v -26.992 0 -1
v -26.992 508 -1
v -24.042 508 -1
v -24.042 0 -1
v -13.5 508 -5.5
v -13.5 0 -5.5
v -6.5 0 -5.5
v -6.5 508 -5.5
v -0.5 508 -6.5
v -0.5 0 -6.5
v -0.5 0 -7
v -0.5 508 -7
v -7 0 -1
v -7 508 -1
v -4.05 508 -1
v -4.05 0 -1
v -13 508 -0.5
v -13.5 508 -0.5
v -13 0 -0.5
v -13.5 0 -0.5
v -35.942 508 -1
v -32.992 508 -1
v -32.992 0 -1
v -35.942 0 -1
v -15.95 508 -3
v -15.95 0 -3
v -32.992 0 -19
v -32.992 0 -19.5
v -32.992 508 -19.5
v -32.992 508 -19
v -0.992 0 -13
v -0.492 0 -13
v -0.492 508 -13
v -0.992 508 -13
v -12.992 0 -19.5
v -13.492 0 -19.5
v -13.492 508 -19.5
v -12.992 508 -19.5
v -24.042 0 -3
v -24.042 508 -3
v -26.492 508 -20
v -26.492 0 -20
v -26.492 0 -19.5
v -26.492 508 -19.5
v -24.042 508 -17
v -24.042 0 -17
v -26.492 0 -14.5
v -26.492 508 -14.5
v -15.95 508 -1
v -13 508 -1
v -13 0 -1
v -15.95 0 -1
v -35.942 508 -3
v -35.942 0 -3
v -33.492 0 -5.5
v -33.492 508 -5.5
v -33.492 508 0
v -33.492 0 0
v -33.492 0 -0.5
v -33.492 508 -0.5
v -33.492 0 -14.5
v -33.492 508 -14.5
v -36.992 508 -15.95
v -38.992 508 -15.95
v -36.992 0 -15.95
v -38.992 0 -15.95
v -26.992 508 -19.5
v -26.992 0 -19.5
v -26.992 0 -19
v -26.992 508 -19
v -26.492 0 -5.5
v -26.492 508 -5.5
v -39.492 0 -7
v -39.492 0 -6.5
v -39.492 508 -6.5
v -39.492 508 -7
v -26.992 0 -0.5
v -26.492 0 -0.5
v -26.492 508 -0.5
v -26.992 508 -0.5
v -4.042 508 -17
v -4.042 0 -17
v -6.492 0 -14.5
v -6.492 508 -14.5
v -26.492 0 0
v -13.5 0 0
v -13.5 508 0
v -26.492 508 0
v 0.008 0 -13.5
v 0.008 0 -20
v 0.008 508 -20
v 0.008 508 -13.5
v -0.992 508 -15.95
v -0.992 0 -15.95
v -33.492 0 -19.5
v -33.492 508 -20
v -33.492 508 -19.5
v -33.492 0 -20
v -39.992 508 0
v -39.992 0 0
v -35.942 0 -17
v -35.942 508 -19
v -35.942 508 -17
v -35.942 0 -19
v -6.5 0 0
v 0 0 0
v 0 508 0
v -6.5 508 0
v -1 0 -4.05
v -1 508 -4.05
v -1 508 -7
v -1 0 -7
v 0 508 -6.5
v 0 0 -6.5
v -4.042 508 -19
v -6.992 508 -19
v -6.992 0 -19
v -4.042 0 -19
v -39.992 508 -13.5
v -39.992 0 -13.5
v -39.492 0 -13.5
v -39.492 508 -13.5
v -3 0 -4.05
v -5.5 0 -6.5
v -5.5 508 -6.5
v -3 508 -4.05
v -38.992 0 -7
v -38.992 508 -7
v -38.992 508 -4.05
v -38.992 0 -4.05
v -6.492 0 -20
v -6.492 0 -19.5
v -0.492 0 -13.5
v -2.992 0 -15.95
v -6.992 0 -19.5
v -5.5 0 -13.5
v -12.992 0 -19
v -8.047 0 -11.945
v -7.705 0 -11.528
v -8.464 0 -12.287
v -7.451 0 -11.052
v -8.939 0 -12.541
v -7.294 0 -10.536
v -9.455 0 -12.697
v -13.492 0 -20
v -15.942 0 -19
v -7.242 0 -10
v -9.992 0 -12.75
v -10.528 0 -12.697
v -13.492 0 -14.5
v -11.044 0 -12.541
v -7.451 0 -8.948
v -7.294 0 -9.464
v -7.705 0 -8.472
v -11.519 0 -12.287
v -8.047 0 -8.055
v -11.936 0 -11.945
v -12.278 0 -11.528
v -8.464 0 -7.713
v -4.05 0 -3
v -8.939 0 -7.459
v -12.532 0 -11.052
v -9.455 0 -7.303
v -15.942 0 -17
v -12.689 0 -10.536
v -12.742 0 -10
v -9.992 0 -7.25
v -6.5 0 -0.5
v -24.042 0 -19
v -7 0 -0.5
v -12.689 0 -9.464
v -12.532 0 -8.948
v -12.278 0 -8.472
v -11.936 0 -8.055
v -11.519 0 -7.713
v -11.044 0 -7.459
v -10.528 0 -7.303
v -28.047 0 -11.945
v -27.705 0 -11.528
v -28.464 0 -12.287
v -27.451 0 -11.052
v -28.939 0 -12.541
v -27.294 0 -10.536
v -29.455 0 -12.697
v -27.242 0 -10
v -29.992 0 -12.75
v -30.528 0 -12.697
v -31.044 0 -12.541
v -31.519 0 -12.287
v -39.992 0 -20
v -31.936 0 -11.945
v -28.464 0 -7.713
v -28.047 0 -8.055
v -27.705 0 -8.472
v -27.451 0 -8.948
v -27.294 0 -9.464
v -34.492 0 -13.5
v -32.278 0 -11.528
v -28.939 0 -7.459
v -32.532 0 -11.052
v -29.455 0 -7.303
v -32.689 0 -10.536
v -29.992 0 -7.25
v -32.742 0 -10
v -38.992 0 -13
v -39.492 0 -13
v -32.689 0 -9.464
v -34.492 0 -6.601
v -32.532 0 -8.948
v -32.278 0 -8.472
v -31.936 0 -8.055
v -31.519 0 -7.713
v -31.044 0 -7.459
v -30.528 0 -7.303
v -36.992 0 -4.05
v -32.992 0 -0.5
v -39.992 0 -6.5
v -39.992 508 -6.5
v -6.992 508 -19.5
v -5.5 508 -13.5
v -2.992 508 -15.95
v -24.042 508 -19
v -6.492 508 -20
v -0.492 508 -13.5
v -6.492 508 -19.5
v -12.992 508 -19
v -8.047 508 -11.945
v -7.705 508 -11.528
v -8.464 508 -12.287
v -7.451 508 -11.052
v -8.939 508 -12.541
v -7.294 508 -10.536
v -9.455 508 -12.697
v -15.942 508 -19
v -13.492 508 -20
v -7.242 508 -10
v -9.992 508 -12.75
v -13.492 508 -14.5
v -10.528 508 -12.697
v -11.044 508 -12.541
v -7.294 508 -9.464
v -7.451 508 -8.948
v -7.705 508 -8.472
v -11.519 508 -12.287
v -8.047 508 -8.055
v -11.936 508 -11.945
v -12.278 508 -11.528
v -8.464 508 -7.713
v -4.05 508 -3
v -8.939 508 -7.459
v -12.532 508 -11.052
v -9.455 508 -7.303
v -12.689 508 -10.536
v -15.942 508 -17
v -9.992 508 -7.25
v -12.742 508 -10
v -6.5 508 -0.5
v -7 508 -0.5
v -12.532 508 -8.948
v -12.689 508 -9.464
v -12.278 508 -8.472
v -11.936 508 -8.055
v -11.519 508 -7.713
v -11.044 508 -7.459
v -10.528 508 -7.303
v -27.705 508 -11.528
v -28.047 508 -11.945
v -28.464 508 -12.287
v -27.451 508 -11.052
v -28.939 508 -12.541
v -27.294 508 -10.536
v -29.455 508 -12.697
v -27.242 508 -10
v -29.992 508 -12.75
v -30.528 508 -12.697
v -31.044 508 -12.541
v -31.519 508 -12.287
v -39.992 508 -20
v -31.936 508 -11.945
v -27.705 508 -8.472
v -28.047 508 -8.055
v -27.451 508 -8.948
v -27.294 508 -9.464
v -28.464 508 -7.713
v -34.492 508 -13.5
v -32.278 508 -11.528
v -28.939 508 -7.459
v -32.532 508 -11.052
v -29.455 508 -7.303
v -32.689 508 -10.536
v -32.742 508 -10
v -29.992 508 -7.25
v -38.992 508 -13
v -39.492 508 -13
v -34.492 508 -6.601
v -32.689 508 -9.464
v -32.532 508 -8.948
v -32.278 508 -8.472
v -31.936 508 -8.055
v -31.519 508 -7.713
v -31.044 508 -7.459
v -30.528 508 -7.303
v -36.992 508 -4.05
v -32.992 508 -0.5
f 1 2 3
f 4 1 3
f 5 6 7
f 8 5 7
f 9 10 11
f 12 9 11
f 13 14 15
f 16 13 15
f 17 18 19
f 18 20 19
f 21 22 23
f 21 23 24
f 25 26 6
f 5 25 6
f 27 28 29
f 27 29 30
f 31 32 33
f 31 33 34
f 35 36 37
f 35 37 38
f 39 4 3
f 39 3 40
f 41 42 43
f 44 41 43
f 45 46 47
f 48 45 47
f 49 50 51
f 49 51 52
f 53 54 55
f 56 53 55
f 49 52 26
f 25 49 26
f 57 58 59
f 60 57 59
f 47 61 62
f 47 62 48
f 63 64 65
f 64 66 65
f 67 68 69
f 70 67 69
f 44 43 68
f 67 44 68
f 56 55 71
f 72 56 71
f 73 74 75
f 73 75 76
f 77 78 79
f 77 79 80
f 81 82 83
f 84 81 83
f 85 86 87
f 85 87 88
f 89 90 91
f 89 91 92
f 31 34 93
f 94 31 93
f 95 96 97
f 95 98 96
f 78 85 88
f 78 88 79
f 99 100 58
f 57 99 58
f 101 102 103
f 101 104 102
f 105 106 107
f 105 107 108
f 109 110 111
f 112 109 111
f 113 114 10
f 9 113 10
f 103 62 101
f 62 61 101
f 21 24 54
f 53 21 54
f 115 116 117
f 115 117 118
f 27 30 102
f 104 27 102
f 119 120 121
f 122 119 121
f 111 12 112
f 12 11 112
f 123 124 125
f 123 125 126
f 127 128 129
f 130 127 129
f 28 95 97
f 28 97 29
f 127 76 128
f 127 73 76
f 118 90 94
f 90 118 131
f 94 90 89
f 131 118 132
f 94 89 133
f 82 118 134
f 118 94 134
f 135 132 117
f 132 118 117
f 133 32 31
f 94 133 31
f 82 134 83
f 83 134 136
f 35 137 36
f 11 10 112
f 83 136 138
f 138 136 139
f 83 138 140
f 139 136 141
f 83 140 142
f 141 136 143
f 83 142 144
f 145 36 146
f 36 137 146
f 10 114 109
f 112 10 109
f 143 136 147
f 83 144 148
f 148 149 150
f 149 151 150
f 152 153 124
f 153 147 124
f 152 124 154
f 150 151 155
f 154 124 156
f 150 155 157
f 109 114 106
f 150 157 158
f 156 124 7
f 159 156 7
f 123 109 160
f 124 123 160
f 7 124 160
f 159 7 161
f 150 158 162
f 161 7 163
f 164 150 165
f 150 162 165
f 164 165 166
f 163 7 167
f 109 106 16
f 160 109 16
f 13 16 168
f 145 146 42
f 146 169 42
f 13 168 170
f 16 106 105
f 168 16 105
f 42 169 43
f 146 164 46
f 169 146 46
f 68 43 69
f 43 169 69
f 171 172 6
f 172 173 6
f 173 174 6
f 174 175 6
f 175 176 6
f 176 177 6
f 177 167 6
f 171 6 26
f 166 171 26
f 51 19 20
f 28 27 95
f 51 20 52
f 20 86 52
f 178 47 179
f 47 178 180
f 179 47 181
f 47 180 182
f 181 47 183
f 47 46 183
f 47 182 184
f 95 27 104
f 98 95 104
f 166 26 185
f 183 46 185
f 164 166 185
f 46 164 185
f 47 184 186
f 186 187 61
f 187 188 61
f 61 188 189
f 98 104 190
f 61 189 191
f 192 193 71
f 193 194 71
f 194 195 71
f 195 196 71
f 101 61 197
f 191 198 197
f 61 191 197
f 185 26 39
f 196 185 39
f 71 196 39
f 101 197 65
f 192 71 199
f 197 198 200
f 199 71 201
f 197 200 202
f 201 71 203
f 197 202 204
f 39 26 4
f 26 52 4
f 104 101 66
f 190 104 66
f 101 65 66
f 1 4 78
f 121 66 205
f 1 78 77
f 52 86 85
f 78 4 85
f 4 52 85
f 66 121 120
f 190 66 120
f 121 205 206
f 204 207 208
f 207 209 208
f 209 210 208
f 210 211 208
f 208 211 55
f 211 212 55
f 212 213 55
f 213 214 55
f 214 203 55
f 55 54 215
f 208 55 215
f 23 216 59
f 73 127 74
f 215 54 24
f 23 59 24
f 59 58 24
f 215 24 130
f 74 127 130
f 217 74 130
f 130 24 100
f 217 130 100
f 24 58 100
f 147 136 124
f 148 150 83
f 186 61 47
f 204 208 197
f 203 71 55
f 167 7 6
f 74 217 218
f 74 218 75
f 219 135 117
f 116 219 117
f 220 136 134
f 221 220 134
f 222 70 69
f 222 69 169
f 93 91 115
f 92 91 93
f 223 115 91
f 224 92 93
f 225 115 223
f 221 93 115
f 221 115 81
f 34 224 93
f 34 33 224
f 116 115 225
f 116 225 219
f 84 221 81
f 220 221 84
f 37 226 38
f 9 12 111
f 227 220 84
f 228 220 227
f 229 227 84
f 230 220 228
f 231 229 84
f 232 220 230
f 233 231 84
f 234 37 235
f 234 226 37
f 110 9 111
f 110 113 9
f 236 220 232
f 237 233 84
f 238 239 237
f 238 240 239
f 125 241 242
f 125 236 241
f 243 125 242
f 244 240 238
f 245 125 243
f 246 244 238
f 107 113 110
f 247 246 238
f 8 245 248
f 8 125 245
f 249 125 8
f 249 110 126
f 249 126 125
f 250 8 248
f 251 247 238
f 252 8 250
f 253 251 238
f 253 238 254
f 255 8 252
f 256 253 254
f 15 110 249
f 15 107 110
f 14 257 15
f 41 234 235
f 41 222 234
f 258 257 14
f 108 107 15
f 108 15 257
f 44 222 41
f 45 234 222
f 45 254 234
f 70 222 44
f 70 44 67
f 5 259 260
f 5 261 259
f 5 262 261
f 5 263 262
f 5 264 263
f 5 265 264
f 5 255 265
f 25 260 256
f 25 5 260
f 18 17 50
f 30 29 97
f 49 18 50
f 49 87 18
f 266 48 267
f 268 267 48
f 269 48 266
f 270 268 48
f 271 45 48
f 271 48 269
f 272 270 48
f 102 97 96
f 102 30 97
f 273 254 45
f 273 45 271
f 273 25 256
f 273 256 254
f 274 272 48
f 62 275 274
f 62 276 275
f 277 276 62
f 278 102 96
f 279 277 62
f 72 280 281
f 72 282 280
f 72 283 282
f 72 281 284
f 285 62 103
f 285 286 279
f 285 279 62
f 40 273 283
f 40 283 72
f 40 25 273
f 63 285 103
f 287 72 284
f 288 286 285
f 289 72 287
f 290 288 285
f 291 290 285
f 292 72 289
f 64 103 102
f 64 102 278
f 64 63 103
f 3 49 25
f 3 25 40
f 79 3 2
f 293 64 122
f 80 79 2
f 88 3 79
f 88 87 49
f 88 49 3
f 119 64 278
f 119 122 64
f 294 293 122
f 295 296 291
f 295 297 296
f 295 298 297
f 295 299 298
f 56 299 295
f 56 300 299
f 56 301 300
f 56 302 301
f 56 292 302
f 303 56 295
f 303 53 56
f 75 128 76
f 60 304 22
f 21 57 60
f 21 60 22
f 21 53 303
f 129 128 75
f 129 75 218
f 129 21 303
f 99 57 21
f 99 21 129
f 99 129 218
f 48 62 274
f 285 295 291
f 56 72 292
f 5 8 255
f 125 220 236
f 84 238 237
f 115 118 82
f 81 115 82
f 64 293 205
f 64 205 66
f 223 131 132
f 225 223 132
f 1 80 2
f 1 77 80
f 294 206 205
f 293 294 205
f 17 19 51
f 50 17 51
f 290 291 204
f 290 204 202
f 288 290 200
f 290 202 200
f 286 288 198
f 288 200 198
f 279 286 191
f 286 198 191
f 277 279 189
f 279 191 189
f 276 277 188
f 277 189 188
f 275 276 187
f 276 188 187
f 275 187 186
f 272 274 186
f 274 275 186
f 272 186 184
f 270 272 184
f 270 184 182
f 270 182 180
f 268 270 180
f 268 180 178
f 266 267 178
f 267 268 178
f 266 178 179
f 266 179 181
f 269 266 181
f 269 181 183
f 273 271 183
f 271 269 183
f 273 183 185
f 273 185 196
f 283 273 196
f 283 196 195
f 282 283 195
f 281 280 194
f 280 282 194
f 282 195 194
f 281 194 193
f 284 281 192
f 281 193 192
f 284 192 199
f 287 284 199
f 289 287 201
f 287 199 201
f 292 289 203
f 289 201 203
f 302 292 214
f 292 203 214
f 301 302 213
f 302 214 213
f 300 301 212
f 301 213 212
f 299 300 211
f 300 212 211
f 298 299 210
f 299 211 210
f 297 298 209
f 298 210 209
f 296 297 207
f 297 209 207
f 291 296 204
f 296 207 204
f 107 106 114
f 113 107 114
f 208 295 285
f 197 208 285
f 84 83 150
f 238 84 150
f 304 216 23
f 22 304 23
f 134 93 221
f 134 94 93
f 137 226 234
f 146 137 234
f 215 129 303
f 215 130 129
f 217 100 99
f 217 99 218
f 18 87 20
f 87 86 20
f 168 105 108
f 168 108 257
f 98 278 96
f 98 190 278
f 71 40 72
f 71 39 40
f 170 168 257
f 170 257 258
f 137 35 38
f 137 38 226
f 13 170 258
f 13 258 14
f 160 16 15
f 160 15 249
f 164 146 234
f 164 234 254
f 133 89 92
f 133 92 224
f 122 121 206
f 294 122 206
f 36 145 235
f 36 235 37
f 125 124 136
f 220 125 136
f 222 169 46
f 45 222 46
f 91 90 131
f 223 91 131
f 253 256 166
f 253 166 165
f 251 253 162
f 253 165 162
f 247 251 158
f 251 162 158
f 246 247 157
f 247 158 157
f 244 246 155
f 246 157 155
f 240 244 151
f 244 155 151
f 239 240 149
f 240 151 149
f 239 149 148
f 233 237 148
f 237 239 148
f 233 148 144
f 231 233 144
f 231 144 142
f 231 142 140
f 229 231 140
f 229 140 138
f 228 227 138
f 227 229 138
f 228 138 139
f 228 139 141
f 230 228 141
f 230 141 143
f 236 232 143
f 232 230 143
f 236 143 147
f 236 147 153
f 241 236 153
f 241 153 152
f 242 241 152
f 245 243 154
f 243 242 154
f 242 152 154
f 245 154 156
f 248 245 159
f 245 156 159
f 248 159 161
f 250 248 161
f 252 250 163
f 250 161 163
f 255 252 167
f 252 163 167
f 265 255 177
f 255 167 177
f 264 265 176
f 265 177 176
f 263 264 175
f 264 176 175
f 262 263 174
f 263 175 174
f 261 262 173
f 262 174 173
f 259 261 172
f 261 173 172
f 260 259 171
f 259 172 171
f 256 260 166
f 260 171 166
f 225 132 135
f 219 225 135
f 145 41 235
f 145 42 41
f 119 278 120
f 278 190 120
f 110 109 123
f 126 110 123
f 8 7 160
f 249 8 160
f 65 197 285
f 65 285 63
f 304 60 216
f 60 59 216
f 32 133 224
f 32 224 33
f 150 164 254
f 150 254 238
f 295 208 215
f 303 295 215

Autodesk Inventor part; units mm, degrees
ref_plane "YZ Plane" through (0, 0, 0) normal (1, 0, 0) x (0, 1, 0)
ref_plane "XZ Plane" through (0, 0, 0) normal (0, 1, 0) x (-1, 0, 0)
ref_plane "XY Plane" through (0, 0, 0) normal (0, 0, 1) x (1, 0, 0)
sketch "Sketch1" plane through (0, 0, 0) normal (0, 1, 0) x (-1, 0, 0)
  circle A0 centre (29.9915, -10) radius 2.75
  circle A1 centre (9.9915, -10) radius 2.75
  line L0 (0, 0) -> (0, -6.5)
  line L1 (-0.0085, -20) -> (-0.0085, -13.5)
  line L2 (0, -6.5) -> (0.5, -6.5)
  line L3 (0.5, -6.5) -> (0.5, -7)
  line L4 (0.5, -7) -> (1, -7)
  line L5 (-0.0085, -13.5) -> (0.4915, -13.5)
  line L6 (0.4915, -13.5) -> (0.4915, -13)
  line L7 (0.4915, -13) -> (0.9915, -13)
  line L8 (1, -4.05) -> (3, -4.05)
  line L9 (0.9915, -15.95) -> (2.9915, -15.95)
  line L10 (5.5, -6.5) -> (5.5, -13.5)
  line L11 (5.5, -13.5) -> (2.9915, -15.95)
  line L12 (5.5, -6.5) -> (3, -4.05)
  line L13 (1, -4.05) -> (1, -7)
  line L14 (0.9915, -13) -> (0.9915, -15.95)
  line L15 (-0.0085, -20) -> (6.4915, -20)
  line L16 (6.4915, -20) -> (6.4915, -19.5)
  line L17 (6.4915, -19.5) -> (6.9915, -19.5)
  line L18 (6.9915, -19.5) -> (6.9915, -19)
  line L19 (6.9915, -19) -> (4.0415, -19)
  line L20 (4.0415, -19) -> (4.0415, -17)
  line L21 (13.4915, -20) -> (13.4915, -19.5)
  line L22 (13.4915, -19.5) -> (12.9915, -19.5)
  line L23 (12.9915, -19.5) -> (12.9915, -19)
  line L24 (12.9915, -19) -> (15.9415, -19)
  line L25 (15.9415, -19) -> (15.9415, -17)
  line L26 (15.9415, -17) -> (13.4915, -14.5)
  line L27 (6.4915, -14.5) -> (13.4915, -14.5)
  line L28 (4.0415, -17) -> (6.4915, -14.5)
  line L29 (39.9915, 0) -> (39.9915, -6.5)
  line L30 (39.9915, -6.5) -> (39.4915, -6.5)
  line L31 (39.4915, -6.5) -> (39.4915, -7)
  line L32 (39.4915, -7) -> (38.9915, -7)
  line L33 (38.9915, -7) -> (38.9915, -4.05)
  line L34 (38.9915, -4.05) -> (36.9915, -4.05)
  line L35 (39.9915, -20) -> (39.9915, -13.5)
  line L36 (39.9915, -13.5) -> (39.4915, -13.5)
  line L37 (39.4915, -13.5) -> (39.4915, -13)
  line L38 (39.4915, -13) -> (38.9915, -13)
  line L39 (38.9915, -13) -> (38.9915, -15.95)
  line L40 (38.9915, -15.95) -> (36.9915, -15.95)
  line L41 (34.4915, -6.601) -> (34.4915, -13.5)
  line L42 (34.4915, -13.5) -> (36.9915, -15.95)
  line L43 (34.4915, -6.601) -> (36.9915, -4.05)
  line L44 (39.9915, -20) -> (33.4915, -20)
  line L45 (33.4915, -20) -> (33.4915, -19.5)
  line L46 (33.4915, -19.5) -> (32.9915, -19.5)
  line L47 (32.9915, -19.5) -> (32.9915, -19)
  line L48 (32.9915, -19) -> (35.9415, -19)
  line L49 (35.9415, -19) -> (35.9415, -17)
  line L50 (26.4915, -20) -> (26.4915, -19.5)
  line L51 (26.4915, -19.5) -> (26.9915, -19.5)
  line L52 (26.9915, -19.5) -> (26.9915, -19)
  line L53 (26.9915, -19) -> (24.0415, -19)
  line L54 (24.0415, -19) -> (24.0415, -17)
  line L55 (33.4915, -14.5) -> (26.4915, -14.5)
  line L56 (24.0415, -17) -> (26.4915, -14.5)
  line L57 (33.4915, -14.5) -> (35.9415, -17)
  line L58 (26.4915, -20) -> (13.4915, -20)
  line L59 (39.9915, 0) -> (33.4915, 0)
  line L60 (33.4915, 0) -> (33.4915, -0.5)
  line L61 (33.4915, -0.5) -> (32.9915, -0.5)
  line L62 (32.9915, -0.5) -> (32.9915, -1)
  line L63 (32.9915, -1) -> (35.9415, -1)
  line L64 (35.9415, -1) -> (35.9415, -3)
  line L65 (26.4915, 0) -> (26.4915, -0.5)
  line L66 (26.4915, -0.5) -> (26.9915, -0.5)
  line L67 (26.9915, -0.5) -> (26.9915, -1)
  line L68 (26.9915, -1) -> (24.0415, -1)
  line L69 (24.0415, -1) -> (24.0415, -3)
  line L70 (33.4915, -5.5) -> (26.4915, -5.5)
  line L71 (24.0415, -3) -> (26.4915, -5.5)
  line L72 (35.9415, -3) -> (33.4915, -5.5)
  line L73 (0, 0) -> (6.5, 0)
  line L74 (6.5, 0) -> (6.5, -0.5)
  line L75 (6.5, -0.5) -> (7, -0.5)
  line L76 (7, -0.5) -> (7, -1)
  line L77 (7, -1) -> (4.05, -1)
  line L78 (4.05, -1) -> (4.05, -3)
  line L79 (13.5, 0) -> (13.5, -0.5)
  line L80 (13.5, -0.5) -> (13, -0.5)
  line L81 (13, -0.5) -> (13, -1)
  line L82 (13, -1) -> (15.95, -1)
  line L83 (15.95, -1) -> (15.95, -3)
  line L84 (13.5, -5.5) -> (6.5, -5.5)
  line L85 (6.5, -5.5) -> (4.05, -3)
  line L86 (15.95, -3) -> (13.5, -5.5)
  line L87 (13.5, 0) -> (26.4915, 0)
  dimension "d0" = 40
  dimension "d1" = 20
  dimension "d2" = 5.5
  dimension "d3" = 5.5
  dimension "d4" = 20
  dimension "d11" = 6.5
  dimension "d12" = 6.5
  dimension "d13" = 0.5
  dimension "d14" = 0.5
  dimension "d15" = 0.5
  dimension "d16" = 0.5
  dimension "d17" = 0.5
  dimension "d18" = 0.5
  dimension "d19" = 5.5
  dimension "d20" = 11.9
  dimension "d21" = 6.5
  dimension "d22" = 0.5
  dimension "d23" = 0.5
  dimension "d24" = 0.5
  dimension "d25" = 0.5
  dimension "d26" = 0.5
  dimension "d27" = 0.5
  dimension "d28" = 7
  dimension "d29" = 11.9
  dimension "d31" = 4.05
  dimension "d32" = 2.95
  dimension "d34" = 2
  dimension "d35" = 2
  dimension "d36" = 2
  dimension "d37" = 2
  dimension "d39" = 7
  dimension "d40" = 6.5
  dimension "d41" = 0.5
  dimension "d42" = 0.5
  dimension "d43" = 0.5
  dimension "d44" = 2.95
  dimension "d45" = 2
  dimension "d46" = 6.5
  dimension "d47" = 0.5
  dimension "d48" = 0.5
  dimension "d49" = 0.5
  dimension "d50" = 2.95
  dimension "d51" = 2
  dimension "d52" = 5.5
  dimension "d53" = 6.5
  dimension "d54" = 0.5
  dimension "d55" = 0.5
  dimension "d56" = 0.5
  dimension "d57" = 2.95
  dimension "d58" = 2
  dimension "d59" = 0.5
  dimension "d60" = 0.5
  dimension "d61" = 0.5
  dimension "d62" = 2.95
  dimension "d63" = 2
  dimension "d64" = 7
  dimension "d66" = 6.5
  dimension "d67" = 0.5
  dimension "d68" = 0.5
  dimension "d69" = 0.5
  dimension "d70" = 2.95
  dimension "d71" = 2
  dimension "d72" = 0.5
  dimension "d73" = 0.5
extrude "Extrusion1" add sketch "Sketch1" along normal blind 508
properties part number "Tslot_2040extrusion_20inch"
